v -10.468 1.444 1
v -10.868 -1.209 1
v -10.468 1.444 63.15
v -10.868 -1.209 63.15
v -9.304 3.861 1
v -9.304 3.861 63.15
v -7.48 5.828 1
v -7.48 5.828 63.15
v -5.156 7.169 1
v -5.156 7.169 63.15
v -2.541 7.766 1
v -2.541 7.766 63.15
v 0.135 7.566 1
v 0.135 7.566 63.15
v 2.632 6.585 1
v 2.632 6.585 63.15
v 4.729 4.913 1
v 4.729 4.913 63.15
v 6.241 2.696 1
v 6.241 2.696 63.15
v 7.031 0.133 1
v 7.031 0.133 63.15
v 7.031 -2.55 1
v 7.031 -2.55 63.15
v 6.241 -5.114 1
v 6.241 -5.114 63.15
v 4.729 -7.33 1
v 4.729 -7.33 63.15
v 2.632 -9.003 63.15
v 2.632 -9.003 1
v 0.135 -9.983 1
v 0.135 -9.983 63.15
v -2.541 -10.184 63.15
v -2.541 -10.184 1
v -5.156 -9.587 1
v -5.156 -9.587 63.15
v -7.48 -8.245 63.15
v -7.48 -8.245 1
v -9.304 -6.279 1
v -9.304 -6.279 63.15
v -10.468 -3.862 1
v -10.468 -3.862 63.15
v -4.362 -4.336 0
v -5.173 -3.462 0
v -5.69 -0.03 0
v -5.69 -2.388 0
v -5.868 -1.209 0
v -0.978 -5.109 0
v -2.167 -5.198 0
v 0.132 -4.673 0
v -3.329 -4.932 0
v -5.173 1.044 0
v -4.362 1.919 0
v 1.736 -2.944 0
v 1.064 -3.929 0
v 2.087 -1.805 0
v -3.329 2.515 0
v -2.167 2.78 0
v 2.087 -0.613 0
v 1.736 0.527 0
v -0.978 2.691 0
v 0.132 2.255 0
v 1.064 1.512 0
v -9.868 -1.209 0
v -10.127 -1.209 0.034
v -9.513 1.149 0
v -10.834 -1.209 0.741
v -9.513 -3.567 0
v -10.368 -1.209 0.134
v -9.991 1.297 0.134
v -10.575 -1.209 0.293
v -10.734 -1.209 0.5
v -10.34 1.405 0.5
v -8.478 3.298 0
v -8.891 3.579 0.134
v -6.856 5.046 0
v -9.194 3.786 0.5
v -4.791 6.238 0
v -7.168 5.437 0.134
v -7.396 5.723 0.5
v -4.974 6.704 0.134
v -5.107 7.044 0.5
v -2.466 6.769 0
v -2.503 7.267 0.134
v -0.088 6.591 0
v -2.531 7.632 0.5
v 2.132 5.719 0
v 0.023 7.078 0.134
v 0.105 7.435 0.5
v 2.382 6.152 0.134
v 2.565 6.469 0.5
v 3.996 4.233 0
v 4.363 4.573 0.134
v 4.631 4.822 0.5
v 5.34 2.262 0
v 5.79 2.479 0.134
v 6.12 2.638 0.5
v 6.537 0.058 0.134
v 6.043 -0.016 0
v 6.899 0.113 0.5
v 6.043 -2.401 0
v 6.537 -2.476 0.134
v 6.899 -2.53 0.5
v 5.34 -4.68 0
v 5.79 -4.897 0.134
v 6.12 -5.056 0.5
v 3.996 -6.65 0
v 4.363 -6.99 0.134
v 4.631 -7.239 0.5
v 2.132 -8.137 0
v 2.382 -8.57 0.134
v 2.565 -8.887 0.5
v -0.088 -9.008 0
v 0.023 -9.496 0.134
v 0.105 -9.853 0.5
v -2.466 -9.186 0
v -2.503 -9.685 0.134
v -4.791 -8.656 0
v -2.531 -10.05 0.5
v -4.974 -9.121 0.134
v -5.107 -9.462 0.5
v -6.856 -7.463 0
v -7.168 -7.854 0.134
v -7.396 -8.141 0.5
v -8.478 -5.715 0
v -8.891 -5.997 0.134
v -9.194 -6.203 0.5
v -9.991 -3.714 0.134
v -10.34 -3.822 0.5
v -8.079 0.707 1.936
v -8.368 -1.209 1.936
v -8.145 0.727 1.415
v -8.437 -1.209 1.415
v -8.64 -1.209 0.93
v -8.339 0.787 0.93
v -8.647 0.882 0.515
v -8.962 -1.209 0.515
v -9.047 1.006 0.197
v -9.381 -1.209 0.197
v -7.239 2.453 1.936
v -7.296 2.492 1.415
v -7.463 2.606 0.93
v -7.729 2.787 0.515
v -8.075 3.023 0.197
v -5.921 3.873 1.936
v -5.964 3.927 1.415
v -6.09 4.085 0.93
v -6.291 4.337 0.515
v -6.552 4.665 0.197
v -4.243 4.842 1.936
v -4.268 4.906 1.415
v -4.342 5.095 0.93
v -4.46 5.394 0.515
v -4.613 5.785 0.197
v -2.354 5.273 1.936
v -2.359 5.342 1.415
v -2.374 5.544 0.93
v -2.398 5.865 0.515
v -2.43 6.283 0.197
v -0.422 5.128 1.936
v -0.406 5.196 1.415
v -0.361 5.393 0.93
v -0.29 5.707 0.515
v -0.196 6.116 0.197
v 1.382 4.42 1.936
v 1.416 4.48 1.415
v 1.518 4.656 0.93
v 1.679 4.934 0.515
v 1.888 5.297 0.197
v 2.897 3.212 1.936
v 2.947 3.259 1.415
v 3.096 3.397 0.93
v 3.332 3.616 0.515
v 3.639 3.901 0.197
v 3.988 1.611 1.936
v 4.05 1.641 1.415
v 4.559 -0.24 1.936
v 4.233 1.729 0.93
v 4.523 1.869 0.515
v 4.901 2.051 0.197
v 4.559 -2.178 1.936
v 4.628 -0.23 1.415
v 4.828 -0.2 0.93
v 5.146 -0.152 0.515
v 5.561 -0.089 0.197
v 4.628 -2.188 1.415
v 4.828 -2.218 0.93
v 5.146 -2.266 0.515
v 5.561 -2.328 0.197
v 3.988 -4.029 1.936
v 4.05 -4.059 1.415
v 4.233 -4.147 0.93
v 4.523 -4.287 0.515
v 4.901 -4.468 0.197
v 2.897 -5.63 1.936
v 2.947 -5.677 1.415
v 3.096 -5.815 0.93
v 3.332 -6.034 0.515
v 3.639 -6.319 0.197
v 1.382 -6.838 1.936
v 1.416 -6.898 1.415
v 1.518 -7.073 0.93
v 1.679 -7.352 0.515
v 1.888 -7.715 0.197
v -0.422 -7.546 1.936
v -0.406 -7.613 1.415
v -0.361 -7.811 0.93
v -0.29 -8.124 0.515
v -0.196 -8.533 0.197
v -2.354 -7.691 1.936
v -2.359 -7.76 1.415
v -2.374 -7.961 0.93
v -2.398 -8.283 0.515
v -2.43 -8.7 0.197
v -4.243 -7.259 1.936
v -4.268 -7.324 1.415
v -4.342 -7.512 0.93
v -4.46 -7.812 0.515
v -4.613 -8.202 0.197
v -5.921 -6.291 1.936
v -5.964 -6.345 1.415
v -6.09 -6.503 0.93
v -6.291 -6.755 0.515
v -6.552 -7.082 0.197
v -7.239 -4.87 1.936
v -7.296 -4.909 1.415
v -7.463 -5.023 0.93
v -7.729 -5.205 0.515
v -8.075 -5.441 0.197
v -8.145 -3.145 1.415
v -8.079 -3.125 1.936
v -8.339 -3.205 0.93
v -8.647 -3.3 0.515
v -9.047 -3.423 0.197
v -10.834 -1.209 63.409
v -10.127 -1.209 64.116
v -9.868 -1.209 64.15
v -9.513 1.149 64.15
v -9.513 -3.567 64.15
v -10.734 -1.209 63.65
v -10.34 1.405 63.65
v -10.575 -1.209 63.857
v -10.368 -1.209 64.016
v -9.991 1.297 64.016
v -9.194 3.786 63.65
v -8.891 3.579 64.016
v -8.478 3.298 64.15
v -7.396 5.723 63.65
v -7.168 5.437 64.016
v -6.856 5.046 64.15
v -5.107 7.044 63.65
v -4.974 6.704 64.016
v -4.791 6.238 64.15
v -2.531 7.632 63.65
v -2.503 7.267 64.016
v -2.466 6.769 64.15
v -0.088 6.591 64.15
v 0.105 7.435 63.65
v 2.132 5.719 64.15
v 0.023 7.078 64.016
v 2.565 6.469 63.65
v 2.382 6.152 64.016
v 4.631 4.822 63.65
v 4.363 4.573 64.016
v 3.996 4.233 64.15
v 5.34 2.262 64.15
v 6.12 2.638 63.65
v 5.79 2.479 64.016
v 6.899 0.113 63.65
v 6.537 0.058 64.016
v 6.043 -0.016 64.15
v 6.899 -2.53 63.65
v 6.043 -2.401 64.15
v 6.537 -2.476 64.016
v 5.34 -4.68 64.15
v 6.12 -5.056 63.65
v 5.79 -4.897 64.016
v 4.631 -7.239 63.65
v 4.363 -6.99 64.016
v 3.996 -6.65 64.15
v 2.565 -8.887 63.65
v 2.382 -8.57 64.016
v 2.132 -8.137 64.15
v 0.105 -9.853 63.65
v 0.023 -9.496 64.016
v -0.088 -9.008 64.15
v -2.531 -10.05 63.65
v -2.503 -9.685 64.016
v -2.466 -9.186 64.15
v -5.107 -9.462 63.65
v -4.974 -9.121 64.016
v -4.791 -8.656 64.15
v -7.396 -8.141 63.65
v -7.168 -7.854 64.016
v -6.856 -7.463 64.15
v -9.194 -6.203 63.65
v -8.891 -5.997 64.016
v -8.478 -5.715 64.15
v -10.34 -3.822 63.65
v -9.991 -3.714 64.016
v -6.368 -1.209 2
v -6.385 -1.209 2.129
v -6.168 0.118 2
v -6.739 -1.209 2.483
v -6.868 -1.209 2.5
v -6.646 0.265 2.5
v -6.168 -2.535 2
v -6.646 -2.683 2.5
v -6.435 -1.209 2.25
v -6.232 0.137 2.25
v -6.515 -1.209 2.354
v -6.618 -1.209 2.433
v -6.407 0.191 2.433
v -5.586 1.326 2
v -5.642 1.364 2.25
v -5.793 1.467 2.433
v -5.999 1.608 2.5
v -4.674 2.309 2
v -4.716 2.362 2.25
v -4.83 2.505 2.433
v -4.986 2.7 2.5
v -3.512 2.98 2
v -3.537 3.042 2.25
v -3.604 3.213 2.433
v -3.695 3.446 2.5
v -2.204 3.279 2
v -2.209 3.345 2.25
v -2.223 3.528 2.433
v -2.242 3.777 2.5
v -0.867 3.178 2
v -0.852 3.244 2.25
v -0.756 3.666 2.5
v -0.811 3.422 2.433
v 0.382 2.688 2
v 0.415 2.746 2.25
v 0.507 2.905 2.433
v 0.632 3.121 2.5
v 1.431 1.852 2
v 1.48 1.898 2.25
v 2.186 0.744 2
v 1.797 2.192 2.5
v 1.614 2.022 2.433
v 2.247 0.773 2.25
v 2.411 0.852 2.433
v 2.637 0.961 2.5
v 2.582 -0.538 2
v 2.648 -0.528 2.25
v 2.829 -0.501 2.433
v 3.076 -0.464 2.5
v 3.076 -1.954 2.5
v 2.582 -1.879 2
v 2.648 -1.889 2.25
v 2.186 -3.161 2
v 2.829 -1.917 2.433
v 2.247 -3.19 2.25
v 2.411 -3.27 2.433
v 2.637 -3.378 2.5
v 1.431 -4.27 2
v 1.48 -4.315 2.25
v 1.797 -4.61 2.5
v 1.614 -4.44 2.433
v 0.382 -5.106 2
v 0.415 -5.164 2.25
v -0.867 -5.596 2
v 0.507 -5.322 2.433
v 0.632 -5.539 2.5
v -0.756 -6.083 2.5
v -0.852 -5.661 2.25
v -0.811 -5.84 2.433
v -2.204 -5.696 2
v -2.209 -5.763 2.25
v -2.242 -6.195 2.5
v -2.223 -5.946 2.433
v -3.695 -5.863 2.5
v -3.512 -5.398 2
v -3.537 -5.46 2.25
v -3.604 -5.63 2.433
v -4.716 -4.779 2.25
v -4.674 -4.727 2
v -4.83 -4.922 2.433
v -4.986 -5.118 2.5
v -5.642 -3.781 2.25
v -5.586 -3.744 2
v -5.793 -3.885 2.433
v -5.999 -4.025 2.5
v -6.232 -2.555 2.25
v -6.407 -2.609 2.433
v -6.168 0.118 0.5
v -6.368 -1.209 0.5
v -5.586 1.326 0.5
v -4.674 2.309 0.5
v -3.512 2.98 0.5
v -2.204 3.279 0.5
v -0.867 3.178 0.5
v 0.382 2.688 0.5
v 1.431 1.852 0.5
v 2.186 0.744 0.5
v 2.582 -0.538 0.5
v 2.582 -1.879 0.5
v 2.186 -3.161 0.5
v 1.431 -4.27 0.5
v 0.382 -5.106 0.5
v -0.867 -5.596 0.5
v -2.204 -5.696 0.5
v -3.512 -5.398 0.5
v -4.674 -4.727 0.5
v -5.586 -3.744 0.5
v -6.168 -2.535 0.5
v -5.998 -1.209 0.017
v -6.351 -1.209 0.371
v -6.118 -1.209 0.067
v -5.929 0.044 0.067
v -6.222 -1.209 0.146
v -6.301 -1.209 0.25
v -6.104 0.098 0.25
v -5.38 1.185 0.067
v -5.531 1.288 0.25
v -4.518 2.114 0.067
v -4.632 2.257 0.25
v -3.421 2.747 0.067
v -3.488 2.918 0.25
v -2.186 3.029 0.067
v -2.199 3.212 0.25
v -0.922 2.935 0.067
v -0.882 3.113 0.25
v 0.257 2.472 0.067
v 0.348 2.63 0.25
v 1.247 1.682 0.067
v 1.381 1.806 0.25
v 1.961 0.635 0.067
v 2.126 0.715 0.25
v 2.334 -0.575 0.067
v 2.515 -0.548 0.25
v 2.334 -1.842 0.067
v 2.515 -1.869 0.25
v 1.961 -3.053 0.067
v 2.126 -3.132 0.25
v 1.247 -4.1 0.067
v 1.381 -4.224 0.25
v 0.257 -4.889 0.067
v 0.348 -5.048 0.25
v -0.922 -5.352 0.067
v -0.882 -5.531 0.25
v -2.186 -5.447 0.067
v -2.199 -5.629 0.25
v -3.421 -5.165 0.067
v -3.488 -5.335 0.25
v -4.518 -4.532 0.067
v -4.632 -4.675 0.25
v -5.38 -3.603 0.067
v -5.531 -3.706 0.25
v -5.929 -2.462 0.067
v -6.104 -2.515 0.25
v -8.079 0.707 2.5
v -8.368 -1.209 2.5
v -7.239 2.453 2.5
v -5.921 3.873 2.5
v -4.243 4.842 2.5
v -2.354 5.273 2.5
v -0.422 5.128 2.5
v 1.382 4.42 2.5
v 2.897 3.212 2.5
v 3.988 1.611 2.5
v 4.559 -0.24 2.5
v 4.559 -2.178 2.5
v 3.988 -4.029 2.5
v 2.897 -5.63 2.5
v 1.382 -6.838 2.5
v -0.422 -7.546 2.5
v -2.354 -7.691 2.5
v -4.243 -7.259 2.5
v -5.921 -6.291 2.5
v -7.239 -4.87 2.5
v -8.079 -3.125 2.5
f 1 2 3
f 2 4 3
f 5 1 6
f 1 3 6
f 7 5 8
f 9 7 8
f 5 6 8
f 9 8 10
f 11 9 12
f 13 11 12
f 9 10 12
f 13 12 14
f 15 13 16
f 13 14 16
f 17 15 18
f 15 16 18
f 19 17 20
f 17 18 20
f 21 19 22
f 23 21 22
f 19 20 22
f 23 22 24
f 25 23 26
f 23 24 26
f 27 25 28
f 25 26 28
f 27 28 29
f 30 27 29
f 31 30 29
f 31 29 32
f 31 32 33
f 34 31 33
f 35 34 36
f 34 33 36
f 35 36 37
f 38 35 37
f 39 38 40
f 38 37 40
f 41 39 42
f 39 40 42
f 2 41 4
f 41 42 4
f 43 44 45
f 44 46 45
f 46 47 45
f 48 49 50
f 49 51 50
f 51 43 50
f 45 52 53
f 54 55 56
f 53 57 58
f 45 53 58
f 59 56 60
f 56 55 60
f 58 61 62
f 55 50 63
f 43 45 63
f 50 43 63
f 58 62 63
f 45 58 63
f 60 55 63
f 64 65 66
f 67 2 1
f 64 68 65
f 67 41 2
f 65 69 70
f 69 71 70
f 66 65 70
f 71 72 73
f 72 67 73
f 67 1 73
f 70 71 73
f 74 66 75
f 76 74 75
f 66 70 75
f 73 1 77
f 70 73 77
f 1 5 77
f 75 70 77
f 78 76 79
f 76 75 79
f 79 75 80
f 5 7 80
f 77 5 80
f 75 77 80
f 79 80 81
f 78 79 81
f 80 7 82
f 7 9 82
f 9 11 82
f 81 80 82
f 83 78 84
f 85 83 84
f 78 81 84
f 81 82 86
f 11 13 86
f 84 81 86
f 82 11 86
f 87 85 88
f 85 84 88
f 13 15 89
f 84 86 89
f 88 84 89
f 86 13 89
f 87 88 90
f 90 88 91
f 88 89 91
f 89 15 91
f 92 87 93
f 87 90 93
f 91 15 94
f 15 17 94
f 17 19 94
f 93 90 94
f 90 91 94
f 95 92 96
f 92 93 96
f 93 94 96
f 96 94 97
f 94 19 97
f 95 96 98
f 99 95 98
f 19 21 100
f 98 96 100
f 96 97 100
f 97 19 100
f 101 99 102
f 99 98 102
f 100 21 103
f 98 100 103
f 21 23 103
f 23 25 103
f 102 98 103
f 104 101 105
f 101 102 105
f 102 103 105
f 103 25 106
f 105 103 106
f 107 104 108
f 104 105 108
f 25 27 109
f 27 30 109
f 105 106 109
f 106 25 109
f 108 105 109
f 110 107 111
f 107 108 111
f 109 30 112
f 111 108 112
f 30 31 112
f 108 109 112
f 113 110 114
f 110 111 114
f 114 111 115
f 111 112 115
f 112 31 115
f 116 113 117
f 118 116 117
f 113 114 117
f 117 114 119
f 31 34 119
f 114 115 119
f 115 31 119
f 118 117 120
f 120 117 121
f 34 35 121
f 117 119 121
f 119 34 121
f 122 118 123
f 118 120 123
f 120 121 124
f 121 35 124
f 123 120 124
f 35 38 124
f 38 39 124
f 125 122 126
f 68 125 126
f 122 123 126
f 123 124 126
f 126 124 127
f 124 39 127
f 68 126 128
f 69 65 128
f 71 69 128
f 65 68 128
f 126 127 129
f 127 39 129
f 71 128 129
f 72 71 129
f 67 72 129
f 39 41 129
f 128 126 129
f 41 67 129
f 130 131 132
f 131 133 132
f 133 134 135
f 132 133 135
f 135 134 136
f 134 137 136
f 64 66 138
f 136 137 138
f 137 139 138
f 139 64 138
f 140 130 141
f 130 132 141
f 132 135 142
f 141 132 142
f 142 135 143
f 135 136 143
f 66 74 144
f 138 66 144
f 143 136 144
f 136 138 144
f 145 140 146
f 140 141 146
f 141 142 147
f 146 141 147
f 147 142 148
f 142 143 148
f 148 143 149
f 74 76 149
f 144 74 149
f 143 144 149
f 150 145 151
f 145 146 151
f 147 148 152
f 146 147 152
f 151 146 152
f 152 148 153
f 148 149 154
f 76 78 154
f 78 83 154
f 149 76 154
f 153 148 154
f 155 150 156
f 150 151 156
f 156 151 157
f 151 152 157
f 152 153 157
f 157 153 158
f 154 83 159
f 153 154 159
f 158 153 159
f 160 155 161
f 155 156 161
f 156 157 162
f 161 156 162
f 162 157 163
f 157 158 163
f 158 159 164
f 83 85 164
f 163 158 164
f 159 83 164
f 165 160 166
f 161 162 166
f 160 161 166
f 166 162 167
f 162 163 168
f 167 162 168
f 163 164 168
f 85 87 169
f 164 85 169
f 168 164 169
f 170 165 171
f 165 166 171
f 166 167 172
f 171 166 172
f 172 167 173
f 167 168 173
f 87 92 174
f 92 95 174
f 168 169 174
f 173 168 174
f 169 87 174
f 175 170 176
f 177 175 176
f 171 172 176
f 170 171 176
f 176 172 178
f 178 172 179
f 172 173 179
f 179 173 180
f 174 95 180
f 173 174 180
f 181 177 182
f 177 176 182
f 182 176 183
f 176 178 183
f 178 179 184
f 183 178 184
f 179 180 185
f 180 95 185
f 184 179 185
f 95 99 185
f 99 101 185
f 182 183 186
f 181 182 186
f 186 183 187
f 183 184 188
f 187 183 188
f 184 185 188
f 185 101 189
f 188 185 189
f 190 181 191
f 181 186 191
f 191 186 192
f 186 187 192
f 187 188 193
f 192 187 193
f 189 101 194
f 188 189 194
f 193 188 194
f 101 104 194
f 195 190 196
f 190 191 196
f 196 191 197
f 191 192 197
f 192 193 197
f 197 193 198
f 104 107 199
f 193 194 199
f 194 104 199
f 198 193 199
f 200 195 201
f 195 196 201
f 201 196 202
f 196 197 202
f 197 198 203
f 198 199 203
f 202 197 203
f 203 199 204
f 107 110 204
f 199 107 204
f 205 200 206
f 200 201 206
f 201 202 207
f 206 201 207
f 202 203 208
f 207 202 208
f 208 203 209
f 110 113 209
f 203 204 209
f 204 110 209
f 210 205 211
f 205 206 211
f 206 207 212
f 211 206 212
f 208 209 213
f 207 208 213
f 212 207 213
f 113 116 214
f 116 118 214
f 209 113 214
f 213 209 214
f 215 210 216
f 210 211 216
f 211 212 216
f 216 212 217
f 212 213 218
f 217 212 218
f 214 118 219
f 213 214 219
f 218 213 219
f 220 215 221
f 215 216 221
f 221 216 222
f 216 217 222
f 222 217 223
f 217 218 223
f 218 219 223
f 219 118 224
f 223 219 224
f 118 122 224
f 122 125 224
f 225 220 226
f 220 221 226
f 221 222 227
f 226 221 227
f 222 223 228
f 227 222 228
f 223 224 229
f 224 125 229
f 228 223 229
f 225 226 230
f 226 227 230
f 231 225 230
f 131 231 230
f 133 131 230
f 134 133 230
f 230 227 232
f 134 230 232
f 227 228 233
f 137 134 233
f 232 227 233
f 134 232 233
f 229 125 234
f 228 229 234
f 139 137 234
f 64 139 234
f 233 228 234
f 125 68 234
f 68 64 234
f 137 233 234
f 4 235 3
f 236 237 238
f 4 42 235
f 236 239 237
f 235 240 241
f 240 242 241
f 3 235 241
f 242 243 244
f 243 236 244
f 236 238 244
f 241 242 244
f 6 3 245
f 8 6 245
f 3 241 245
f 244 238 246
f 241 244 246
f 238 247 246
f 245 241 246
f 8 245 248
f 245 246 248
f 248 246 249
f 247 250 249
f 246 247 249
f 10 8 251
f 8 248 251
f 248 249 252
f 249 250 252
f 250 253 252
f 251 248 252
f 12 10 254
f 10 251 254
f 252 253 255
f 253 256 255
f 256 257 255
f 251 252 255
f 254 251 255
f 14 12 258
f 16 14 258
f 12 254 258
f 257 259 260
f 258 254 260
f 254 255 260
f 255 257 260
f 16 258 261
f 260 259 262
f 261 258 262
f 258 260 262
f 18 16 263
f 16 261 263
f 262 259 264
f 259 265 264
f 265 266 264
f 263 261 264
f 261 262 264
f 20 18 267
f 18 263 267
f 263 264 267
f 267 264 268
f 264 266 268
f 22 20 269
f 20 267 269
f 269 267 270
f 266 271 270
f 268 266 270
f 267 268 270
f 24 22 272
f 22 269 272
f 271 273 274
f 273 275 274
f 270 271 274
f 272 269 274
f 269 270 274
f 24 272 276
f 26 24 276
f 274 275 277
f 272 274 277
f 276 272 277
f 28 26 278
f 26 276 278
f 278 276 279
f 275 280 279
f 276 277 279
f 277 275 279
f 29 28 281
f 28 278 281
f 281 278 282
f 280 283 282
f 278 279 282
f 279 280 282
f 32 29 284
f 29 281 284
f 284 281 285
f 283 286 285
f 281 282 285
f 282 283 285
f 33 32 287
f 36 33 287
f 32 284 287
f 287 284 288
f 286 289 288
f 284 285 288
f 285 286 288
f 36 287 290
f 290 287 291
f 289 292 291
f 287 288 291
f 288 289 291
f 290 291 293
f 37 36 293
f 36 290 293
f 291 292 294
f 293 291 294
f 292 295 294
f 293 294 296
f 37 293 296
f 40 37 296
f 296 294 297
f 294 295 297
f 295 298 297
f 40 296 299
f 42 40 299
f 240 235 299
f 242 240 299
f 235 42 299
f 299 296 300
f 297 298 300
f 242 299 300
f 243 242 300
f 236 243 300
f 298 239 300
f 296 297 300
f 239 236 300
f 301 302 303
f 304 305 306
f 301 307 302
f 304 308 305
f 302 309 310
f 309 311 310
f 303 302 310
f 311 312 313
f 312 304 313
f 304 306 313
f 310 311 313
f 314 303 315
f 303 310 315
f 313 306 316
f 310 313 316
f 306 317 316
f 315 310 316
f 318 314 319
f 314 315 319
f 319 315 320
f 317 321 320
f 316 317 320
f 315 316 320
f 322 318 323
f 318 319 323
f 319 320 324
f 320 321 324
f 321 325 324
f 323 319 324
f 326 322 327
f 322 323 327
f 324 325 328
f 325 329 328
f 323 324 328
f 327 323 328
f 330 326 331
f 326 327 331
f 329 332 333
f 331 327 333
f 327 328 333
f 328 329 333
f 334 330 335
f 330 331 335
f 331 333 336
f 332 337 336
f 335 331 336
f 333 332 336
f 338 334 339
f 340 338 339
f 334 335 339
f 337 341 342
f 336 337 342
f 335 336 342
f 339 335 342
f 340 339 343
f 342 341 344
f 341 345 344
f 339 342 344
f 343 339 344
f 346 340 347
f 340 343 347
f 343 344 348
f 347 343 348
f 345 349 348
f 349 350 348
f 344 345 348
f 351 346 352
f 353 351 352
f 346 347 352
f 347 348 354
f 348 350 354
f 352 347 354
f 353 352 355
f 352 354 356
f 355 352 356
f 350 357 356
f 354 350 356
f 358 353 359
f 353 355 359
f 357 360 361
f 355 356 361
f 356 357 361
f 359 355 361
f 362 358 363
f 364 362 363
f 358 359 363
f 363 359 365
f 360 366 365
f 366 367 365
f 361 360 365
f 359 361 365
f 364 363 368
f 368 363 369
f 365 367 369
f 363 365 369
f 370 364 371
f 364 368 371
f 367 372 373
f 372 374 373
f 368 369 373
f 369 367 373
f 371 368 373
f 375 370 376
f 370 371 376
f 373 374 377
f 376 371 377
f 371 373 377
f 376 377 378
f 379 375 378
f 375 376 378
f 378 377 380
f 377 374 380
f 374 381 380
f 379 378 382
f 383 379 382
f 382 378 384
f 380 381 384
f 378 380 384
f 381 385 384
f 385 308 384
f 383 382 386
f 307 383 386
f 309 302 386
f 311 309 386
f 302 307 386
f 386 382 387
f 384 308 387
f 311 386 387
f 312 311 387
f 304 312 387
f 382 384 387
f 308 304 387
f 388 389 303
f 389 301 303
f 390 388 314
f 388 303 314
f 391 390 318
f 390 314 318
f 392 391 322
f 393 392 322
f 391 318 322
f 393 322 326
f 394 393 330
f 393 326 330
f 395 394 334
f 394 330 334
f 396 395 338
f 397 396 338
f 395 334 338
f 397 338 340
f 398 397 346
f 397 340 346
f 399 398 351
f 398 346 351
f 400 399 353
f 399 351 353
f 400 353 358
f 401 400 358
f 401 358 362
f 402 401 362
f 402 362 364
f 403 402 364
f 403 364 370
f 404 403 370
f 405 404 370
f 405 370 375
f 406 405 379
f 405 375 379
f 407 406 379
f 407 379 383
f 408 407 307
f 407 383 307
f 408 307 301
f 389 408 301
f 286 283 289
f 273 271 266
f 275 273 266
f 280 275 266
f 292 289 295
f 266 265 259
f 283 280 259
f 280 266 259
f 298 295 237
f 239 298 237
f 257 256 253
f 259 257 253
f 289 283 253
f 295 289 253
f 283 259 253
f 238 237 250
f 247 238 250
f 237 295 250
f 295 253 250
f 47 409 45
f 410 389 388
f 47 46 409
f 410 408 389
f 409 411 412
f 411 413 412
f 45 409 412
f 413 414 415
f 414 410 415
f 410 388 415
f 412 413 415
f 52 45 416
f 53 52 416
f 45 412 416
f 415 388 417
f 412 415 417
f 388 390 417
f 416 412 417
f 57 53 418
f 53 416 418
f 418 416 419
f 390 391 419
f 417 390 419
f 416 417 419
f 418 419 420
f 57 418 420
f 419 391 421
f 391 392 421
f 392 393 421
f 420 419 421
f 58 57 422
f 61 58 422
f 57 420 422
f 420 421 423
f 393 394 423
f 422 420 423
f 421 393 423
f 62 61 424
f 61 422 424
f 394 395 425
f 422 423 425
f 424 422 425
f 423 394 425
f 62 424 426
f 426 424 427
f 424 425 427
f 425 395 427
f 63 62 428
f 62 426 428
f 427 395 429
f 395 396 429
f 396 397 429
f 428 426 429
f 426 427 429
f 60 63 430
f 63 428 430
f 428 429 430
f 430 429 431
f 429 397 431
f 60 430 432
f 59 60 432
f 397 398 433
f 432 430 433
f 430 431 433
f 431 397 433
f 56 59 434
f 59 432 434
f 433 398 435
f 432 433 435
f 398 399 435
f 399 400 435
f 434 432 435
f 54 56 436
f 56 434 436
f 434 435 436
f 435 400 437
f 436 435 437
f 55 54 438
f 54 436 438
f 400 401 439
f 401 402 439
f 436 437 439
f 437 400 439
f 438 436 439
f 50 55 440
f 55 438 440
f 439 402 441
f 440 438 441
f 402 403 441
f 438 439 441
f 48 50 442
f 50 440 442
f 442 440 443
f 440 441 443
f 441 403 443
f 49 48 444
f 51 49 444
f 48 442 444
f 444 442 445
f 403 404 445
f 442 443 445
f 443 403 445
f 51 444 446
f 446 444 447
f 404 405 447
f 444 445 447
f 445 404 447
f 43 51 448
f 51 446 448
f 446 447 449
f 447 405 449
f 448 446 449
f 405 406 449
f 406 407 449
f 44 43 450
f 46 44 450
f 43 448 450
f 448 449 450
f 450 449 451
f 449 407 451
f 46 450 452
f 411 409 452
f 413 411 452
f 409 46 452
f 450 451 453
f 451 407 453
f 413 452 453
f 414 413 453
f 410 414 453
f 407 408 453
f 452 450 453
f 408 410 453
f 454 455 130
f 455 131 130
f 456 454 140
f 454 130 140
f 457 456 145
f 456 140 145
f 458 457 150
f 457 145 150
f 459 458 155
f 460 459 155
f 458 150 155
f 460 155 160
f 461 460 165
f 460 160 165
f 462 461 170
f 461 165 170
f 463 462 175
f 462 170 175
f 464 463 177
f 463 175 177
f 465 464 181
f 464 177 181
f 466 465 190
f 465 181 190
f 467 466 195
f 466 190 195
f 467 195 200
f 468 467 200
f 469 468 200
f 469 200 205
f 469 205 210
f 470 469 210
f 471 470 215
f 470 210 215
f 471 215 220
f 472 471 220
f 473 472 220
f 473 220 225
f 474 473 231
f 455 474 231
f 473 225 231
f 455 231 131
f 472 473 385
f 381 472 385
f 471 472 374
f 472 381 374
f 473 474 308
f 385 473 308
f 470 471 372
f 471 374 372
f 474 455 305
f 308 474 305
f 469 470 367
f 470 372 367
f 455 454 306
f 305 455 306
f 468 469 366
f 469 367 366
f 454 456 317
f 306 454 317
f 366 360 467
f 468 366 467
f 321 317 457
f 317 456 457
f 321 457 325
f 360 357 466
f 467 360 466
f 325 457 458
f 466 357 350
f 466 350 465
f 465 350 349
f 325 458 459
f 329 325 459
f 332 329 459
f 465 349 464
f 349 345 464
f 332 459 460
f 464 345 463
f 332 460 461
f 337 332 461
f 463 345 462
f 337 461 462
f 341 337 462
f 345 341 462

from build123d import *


with BuildPart() as part:
    # Sketch1 → Revolve1 (revolve)
    with BuildSketch(Plane.XZ.offset(1.208791209), mode=Mode.PRIVATE) as revolve1_sk:
        with BuildLine():
            Line((6.131868132, 64.15), (-1.868131868, 64.15))
            Line((-1.868131868, 64.15), (-1.868131868, 0))
            Line((-1.868131868, 0), (2.131868132, 0))
            ThreePointArc((2.131868132, 0), (2.485421522, 0.146446609), (2.631868132, 0.5))
            Line((2.631868132, 0.5), (2.631868132, 2))
            ThreePointArc((2.631868132, 2), (2.778314741, 2.353553391), (3.131868132, 2.5))
            Line((3.131868132, 2.5), (4.631868132, 2.5))
            Line((4.631868132, 2.5), (4.631868132, 1.936491673))
            ThreePointArc((4.631868132, 1.936491673), (5.050729302, 0.711746802), (6.131868132, 0))
            ThreePointArc((6.131868132, 0), (6.838974913, 0.292893219), (7.131868132, 1))
            Line((7.131868132, 1), (7.131868132, 63.15))
            ThreePointArc((7.131868132, 63.15), (6.838974913, 63.857106781), (6.131868132, 64.15))
        make_face()
    revolve(revolve1_sk.sketch.rotate(Axis((-1.868131868, -1.208791209, 64.151253994), (0, 0, -1)), 180), axis=Axis((-1.868131868, -1.208791209, 64.151253994), (0, 0, -1)))


solid = part.part
